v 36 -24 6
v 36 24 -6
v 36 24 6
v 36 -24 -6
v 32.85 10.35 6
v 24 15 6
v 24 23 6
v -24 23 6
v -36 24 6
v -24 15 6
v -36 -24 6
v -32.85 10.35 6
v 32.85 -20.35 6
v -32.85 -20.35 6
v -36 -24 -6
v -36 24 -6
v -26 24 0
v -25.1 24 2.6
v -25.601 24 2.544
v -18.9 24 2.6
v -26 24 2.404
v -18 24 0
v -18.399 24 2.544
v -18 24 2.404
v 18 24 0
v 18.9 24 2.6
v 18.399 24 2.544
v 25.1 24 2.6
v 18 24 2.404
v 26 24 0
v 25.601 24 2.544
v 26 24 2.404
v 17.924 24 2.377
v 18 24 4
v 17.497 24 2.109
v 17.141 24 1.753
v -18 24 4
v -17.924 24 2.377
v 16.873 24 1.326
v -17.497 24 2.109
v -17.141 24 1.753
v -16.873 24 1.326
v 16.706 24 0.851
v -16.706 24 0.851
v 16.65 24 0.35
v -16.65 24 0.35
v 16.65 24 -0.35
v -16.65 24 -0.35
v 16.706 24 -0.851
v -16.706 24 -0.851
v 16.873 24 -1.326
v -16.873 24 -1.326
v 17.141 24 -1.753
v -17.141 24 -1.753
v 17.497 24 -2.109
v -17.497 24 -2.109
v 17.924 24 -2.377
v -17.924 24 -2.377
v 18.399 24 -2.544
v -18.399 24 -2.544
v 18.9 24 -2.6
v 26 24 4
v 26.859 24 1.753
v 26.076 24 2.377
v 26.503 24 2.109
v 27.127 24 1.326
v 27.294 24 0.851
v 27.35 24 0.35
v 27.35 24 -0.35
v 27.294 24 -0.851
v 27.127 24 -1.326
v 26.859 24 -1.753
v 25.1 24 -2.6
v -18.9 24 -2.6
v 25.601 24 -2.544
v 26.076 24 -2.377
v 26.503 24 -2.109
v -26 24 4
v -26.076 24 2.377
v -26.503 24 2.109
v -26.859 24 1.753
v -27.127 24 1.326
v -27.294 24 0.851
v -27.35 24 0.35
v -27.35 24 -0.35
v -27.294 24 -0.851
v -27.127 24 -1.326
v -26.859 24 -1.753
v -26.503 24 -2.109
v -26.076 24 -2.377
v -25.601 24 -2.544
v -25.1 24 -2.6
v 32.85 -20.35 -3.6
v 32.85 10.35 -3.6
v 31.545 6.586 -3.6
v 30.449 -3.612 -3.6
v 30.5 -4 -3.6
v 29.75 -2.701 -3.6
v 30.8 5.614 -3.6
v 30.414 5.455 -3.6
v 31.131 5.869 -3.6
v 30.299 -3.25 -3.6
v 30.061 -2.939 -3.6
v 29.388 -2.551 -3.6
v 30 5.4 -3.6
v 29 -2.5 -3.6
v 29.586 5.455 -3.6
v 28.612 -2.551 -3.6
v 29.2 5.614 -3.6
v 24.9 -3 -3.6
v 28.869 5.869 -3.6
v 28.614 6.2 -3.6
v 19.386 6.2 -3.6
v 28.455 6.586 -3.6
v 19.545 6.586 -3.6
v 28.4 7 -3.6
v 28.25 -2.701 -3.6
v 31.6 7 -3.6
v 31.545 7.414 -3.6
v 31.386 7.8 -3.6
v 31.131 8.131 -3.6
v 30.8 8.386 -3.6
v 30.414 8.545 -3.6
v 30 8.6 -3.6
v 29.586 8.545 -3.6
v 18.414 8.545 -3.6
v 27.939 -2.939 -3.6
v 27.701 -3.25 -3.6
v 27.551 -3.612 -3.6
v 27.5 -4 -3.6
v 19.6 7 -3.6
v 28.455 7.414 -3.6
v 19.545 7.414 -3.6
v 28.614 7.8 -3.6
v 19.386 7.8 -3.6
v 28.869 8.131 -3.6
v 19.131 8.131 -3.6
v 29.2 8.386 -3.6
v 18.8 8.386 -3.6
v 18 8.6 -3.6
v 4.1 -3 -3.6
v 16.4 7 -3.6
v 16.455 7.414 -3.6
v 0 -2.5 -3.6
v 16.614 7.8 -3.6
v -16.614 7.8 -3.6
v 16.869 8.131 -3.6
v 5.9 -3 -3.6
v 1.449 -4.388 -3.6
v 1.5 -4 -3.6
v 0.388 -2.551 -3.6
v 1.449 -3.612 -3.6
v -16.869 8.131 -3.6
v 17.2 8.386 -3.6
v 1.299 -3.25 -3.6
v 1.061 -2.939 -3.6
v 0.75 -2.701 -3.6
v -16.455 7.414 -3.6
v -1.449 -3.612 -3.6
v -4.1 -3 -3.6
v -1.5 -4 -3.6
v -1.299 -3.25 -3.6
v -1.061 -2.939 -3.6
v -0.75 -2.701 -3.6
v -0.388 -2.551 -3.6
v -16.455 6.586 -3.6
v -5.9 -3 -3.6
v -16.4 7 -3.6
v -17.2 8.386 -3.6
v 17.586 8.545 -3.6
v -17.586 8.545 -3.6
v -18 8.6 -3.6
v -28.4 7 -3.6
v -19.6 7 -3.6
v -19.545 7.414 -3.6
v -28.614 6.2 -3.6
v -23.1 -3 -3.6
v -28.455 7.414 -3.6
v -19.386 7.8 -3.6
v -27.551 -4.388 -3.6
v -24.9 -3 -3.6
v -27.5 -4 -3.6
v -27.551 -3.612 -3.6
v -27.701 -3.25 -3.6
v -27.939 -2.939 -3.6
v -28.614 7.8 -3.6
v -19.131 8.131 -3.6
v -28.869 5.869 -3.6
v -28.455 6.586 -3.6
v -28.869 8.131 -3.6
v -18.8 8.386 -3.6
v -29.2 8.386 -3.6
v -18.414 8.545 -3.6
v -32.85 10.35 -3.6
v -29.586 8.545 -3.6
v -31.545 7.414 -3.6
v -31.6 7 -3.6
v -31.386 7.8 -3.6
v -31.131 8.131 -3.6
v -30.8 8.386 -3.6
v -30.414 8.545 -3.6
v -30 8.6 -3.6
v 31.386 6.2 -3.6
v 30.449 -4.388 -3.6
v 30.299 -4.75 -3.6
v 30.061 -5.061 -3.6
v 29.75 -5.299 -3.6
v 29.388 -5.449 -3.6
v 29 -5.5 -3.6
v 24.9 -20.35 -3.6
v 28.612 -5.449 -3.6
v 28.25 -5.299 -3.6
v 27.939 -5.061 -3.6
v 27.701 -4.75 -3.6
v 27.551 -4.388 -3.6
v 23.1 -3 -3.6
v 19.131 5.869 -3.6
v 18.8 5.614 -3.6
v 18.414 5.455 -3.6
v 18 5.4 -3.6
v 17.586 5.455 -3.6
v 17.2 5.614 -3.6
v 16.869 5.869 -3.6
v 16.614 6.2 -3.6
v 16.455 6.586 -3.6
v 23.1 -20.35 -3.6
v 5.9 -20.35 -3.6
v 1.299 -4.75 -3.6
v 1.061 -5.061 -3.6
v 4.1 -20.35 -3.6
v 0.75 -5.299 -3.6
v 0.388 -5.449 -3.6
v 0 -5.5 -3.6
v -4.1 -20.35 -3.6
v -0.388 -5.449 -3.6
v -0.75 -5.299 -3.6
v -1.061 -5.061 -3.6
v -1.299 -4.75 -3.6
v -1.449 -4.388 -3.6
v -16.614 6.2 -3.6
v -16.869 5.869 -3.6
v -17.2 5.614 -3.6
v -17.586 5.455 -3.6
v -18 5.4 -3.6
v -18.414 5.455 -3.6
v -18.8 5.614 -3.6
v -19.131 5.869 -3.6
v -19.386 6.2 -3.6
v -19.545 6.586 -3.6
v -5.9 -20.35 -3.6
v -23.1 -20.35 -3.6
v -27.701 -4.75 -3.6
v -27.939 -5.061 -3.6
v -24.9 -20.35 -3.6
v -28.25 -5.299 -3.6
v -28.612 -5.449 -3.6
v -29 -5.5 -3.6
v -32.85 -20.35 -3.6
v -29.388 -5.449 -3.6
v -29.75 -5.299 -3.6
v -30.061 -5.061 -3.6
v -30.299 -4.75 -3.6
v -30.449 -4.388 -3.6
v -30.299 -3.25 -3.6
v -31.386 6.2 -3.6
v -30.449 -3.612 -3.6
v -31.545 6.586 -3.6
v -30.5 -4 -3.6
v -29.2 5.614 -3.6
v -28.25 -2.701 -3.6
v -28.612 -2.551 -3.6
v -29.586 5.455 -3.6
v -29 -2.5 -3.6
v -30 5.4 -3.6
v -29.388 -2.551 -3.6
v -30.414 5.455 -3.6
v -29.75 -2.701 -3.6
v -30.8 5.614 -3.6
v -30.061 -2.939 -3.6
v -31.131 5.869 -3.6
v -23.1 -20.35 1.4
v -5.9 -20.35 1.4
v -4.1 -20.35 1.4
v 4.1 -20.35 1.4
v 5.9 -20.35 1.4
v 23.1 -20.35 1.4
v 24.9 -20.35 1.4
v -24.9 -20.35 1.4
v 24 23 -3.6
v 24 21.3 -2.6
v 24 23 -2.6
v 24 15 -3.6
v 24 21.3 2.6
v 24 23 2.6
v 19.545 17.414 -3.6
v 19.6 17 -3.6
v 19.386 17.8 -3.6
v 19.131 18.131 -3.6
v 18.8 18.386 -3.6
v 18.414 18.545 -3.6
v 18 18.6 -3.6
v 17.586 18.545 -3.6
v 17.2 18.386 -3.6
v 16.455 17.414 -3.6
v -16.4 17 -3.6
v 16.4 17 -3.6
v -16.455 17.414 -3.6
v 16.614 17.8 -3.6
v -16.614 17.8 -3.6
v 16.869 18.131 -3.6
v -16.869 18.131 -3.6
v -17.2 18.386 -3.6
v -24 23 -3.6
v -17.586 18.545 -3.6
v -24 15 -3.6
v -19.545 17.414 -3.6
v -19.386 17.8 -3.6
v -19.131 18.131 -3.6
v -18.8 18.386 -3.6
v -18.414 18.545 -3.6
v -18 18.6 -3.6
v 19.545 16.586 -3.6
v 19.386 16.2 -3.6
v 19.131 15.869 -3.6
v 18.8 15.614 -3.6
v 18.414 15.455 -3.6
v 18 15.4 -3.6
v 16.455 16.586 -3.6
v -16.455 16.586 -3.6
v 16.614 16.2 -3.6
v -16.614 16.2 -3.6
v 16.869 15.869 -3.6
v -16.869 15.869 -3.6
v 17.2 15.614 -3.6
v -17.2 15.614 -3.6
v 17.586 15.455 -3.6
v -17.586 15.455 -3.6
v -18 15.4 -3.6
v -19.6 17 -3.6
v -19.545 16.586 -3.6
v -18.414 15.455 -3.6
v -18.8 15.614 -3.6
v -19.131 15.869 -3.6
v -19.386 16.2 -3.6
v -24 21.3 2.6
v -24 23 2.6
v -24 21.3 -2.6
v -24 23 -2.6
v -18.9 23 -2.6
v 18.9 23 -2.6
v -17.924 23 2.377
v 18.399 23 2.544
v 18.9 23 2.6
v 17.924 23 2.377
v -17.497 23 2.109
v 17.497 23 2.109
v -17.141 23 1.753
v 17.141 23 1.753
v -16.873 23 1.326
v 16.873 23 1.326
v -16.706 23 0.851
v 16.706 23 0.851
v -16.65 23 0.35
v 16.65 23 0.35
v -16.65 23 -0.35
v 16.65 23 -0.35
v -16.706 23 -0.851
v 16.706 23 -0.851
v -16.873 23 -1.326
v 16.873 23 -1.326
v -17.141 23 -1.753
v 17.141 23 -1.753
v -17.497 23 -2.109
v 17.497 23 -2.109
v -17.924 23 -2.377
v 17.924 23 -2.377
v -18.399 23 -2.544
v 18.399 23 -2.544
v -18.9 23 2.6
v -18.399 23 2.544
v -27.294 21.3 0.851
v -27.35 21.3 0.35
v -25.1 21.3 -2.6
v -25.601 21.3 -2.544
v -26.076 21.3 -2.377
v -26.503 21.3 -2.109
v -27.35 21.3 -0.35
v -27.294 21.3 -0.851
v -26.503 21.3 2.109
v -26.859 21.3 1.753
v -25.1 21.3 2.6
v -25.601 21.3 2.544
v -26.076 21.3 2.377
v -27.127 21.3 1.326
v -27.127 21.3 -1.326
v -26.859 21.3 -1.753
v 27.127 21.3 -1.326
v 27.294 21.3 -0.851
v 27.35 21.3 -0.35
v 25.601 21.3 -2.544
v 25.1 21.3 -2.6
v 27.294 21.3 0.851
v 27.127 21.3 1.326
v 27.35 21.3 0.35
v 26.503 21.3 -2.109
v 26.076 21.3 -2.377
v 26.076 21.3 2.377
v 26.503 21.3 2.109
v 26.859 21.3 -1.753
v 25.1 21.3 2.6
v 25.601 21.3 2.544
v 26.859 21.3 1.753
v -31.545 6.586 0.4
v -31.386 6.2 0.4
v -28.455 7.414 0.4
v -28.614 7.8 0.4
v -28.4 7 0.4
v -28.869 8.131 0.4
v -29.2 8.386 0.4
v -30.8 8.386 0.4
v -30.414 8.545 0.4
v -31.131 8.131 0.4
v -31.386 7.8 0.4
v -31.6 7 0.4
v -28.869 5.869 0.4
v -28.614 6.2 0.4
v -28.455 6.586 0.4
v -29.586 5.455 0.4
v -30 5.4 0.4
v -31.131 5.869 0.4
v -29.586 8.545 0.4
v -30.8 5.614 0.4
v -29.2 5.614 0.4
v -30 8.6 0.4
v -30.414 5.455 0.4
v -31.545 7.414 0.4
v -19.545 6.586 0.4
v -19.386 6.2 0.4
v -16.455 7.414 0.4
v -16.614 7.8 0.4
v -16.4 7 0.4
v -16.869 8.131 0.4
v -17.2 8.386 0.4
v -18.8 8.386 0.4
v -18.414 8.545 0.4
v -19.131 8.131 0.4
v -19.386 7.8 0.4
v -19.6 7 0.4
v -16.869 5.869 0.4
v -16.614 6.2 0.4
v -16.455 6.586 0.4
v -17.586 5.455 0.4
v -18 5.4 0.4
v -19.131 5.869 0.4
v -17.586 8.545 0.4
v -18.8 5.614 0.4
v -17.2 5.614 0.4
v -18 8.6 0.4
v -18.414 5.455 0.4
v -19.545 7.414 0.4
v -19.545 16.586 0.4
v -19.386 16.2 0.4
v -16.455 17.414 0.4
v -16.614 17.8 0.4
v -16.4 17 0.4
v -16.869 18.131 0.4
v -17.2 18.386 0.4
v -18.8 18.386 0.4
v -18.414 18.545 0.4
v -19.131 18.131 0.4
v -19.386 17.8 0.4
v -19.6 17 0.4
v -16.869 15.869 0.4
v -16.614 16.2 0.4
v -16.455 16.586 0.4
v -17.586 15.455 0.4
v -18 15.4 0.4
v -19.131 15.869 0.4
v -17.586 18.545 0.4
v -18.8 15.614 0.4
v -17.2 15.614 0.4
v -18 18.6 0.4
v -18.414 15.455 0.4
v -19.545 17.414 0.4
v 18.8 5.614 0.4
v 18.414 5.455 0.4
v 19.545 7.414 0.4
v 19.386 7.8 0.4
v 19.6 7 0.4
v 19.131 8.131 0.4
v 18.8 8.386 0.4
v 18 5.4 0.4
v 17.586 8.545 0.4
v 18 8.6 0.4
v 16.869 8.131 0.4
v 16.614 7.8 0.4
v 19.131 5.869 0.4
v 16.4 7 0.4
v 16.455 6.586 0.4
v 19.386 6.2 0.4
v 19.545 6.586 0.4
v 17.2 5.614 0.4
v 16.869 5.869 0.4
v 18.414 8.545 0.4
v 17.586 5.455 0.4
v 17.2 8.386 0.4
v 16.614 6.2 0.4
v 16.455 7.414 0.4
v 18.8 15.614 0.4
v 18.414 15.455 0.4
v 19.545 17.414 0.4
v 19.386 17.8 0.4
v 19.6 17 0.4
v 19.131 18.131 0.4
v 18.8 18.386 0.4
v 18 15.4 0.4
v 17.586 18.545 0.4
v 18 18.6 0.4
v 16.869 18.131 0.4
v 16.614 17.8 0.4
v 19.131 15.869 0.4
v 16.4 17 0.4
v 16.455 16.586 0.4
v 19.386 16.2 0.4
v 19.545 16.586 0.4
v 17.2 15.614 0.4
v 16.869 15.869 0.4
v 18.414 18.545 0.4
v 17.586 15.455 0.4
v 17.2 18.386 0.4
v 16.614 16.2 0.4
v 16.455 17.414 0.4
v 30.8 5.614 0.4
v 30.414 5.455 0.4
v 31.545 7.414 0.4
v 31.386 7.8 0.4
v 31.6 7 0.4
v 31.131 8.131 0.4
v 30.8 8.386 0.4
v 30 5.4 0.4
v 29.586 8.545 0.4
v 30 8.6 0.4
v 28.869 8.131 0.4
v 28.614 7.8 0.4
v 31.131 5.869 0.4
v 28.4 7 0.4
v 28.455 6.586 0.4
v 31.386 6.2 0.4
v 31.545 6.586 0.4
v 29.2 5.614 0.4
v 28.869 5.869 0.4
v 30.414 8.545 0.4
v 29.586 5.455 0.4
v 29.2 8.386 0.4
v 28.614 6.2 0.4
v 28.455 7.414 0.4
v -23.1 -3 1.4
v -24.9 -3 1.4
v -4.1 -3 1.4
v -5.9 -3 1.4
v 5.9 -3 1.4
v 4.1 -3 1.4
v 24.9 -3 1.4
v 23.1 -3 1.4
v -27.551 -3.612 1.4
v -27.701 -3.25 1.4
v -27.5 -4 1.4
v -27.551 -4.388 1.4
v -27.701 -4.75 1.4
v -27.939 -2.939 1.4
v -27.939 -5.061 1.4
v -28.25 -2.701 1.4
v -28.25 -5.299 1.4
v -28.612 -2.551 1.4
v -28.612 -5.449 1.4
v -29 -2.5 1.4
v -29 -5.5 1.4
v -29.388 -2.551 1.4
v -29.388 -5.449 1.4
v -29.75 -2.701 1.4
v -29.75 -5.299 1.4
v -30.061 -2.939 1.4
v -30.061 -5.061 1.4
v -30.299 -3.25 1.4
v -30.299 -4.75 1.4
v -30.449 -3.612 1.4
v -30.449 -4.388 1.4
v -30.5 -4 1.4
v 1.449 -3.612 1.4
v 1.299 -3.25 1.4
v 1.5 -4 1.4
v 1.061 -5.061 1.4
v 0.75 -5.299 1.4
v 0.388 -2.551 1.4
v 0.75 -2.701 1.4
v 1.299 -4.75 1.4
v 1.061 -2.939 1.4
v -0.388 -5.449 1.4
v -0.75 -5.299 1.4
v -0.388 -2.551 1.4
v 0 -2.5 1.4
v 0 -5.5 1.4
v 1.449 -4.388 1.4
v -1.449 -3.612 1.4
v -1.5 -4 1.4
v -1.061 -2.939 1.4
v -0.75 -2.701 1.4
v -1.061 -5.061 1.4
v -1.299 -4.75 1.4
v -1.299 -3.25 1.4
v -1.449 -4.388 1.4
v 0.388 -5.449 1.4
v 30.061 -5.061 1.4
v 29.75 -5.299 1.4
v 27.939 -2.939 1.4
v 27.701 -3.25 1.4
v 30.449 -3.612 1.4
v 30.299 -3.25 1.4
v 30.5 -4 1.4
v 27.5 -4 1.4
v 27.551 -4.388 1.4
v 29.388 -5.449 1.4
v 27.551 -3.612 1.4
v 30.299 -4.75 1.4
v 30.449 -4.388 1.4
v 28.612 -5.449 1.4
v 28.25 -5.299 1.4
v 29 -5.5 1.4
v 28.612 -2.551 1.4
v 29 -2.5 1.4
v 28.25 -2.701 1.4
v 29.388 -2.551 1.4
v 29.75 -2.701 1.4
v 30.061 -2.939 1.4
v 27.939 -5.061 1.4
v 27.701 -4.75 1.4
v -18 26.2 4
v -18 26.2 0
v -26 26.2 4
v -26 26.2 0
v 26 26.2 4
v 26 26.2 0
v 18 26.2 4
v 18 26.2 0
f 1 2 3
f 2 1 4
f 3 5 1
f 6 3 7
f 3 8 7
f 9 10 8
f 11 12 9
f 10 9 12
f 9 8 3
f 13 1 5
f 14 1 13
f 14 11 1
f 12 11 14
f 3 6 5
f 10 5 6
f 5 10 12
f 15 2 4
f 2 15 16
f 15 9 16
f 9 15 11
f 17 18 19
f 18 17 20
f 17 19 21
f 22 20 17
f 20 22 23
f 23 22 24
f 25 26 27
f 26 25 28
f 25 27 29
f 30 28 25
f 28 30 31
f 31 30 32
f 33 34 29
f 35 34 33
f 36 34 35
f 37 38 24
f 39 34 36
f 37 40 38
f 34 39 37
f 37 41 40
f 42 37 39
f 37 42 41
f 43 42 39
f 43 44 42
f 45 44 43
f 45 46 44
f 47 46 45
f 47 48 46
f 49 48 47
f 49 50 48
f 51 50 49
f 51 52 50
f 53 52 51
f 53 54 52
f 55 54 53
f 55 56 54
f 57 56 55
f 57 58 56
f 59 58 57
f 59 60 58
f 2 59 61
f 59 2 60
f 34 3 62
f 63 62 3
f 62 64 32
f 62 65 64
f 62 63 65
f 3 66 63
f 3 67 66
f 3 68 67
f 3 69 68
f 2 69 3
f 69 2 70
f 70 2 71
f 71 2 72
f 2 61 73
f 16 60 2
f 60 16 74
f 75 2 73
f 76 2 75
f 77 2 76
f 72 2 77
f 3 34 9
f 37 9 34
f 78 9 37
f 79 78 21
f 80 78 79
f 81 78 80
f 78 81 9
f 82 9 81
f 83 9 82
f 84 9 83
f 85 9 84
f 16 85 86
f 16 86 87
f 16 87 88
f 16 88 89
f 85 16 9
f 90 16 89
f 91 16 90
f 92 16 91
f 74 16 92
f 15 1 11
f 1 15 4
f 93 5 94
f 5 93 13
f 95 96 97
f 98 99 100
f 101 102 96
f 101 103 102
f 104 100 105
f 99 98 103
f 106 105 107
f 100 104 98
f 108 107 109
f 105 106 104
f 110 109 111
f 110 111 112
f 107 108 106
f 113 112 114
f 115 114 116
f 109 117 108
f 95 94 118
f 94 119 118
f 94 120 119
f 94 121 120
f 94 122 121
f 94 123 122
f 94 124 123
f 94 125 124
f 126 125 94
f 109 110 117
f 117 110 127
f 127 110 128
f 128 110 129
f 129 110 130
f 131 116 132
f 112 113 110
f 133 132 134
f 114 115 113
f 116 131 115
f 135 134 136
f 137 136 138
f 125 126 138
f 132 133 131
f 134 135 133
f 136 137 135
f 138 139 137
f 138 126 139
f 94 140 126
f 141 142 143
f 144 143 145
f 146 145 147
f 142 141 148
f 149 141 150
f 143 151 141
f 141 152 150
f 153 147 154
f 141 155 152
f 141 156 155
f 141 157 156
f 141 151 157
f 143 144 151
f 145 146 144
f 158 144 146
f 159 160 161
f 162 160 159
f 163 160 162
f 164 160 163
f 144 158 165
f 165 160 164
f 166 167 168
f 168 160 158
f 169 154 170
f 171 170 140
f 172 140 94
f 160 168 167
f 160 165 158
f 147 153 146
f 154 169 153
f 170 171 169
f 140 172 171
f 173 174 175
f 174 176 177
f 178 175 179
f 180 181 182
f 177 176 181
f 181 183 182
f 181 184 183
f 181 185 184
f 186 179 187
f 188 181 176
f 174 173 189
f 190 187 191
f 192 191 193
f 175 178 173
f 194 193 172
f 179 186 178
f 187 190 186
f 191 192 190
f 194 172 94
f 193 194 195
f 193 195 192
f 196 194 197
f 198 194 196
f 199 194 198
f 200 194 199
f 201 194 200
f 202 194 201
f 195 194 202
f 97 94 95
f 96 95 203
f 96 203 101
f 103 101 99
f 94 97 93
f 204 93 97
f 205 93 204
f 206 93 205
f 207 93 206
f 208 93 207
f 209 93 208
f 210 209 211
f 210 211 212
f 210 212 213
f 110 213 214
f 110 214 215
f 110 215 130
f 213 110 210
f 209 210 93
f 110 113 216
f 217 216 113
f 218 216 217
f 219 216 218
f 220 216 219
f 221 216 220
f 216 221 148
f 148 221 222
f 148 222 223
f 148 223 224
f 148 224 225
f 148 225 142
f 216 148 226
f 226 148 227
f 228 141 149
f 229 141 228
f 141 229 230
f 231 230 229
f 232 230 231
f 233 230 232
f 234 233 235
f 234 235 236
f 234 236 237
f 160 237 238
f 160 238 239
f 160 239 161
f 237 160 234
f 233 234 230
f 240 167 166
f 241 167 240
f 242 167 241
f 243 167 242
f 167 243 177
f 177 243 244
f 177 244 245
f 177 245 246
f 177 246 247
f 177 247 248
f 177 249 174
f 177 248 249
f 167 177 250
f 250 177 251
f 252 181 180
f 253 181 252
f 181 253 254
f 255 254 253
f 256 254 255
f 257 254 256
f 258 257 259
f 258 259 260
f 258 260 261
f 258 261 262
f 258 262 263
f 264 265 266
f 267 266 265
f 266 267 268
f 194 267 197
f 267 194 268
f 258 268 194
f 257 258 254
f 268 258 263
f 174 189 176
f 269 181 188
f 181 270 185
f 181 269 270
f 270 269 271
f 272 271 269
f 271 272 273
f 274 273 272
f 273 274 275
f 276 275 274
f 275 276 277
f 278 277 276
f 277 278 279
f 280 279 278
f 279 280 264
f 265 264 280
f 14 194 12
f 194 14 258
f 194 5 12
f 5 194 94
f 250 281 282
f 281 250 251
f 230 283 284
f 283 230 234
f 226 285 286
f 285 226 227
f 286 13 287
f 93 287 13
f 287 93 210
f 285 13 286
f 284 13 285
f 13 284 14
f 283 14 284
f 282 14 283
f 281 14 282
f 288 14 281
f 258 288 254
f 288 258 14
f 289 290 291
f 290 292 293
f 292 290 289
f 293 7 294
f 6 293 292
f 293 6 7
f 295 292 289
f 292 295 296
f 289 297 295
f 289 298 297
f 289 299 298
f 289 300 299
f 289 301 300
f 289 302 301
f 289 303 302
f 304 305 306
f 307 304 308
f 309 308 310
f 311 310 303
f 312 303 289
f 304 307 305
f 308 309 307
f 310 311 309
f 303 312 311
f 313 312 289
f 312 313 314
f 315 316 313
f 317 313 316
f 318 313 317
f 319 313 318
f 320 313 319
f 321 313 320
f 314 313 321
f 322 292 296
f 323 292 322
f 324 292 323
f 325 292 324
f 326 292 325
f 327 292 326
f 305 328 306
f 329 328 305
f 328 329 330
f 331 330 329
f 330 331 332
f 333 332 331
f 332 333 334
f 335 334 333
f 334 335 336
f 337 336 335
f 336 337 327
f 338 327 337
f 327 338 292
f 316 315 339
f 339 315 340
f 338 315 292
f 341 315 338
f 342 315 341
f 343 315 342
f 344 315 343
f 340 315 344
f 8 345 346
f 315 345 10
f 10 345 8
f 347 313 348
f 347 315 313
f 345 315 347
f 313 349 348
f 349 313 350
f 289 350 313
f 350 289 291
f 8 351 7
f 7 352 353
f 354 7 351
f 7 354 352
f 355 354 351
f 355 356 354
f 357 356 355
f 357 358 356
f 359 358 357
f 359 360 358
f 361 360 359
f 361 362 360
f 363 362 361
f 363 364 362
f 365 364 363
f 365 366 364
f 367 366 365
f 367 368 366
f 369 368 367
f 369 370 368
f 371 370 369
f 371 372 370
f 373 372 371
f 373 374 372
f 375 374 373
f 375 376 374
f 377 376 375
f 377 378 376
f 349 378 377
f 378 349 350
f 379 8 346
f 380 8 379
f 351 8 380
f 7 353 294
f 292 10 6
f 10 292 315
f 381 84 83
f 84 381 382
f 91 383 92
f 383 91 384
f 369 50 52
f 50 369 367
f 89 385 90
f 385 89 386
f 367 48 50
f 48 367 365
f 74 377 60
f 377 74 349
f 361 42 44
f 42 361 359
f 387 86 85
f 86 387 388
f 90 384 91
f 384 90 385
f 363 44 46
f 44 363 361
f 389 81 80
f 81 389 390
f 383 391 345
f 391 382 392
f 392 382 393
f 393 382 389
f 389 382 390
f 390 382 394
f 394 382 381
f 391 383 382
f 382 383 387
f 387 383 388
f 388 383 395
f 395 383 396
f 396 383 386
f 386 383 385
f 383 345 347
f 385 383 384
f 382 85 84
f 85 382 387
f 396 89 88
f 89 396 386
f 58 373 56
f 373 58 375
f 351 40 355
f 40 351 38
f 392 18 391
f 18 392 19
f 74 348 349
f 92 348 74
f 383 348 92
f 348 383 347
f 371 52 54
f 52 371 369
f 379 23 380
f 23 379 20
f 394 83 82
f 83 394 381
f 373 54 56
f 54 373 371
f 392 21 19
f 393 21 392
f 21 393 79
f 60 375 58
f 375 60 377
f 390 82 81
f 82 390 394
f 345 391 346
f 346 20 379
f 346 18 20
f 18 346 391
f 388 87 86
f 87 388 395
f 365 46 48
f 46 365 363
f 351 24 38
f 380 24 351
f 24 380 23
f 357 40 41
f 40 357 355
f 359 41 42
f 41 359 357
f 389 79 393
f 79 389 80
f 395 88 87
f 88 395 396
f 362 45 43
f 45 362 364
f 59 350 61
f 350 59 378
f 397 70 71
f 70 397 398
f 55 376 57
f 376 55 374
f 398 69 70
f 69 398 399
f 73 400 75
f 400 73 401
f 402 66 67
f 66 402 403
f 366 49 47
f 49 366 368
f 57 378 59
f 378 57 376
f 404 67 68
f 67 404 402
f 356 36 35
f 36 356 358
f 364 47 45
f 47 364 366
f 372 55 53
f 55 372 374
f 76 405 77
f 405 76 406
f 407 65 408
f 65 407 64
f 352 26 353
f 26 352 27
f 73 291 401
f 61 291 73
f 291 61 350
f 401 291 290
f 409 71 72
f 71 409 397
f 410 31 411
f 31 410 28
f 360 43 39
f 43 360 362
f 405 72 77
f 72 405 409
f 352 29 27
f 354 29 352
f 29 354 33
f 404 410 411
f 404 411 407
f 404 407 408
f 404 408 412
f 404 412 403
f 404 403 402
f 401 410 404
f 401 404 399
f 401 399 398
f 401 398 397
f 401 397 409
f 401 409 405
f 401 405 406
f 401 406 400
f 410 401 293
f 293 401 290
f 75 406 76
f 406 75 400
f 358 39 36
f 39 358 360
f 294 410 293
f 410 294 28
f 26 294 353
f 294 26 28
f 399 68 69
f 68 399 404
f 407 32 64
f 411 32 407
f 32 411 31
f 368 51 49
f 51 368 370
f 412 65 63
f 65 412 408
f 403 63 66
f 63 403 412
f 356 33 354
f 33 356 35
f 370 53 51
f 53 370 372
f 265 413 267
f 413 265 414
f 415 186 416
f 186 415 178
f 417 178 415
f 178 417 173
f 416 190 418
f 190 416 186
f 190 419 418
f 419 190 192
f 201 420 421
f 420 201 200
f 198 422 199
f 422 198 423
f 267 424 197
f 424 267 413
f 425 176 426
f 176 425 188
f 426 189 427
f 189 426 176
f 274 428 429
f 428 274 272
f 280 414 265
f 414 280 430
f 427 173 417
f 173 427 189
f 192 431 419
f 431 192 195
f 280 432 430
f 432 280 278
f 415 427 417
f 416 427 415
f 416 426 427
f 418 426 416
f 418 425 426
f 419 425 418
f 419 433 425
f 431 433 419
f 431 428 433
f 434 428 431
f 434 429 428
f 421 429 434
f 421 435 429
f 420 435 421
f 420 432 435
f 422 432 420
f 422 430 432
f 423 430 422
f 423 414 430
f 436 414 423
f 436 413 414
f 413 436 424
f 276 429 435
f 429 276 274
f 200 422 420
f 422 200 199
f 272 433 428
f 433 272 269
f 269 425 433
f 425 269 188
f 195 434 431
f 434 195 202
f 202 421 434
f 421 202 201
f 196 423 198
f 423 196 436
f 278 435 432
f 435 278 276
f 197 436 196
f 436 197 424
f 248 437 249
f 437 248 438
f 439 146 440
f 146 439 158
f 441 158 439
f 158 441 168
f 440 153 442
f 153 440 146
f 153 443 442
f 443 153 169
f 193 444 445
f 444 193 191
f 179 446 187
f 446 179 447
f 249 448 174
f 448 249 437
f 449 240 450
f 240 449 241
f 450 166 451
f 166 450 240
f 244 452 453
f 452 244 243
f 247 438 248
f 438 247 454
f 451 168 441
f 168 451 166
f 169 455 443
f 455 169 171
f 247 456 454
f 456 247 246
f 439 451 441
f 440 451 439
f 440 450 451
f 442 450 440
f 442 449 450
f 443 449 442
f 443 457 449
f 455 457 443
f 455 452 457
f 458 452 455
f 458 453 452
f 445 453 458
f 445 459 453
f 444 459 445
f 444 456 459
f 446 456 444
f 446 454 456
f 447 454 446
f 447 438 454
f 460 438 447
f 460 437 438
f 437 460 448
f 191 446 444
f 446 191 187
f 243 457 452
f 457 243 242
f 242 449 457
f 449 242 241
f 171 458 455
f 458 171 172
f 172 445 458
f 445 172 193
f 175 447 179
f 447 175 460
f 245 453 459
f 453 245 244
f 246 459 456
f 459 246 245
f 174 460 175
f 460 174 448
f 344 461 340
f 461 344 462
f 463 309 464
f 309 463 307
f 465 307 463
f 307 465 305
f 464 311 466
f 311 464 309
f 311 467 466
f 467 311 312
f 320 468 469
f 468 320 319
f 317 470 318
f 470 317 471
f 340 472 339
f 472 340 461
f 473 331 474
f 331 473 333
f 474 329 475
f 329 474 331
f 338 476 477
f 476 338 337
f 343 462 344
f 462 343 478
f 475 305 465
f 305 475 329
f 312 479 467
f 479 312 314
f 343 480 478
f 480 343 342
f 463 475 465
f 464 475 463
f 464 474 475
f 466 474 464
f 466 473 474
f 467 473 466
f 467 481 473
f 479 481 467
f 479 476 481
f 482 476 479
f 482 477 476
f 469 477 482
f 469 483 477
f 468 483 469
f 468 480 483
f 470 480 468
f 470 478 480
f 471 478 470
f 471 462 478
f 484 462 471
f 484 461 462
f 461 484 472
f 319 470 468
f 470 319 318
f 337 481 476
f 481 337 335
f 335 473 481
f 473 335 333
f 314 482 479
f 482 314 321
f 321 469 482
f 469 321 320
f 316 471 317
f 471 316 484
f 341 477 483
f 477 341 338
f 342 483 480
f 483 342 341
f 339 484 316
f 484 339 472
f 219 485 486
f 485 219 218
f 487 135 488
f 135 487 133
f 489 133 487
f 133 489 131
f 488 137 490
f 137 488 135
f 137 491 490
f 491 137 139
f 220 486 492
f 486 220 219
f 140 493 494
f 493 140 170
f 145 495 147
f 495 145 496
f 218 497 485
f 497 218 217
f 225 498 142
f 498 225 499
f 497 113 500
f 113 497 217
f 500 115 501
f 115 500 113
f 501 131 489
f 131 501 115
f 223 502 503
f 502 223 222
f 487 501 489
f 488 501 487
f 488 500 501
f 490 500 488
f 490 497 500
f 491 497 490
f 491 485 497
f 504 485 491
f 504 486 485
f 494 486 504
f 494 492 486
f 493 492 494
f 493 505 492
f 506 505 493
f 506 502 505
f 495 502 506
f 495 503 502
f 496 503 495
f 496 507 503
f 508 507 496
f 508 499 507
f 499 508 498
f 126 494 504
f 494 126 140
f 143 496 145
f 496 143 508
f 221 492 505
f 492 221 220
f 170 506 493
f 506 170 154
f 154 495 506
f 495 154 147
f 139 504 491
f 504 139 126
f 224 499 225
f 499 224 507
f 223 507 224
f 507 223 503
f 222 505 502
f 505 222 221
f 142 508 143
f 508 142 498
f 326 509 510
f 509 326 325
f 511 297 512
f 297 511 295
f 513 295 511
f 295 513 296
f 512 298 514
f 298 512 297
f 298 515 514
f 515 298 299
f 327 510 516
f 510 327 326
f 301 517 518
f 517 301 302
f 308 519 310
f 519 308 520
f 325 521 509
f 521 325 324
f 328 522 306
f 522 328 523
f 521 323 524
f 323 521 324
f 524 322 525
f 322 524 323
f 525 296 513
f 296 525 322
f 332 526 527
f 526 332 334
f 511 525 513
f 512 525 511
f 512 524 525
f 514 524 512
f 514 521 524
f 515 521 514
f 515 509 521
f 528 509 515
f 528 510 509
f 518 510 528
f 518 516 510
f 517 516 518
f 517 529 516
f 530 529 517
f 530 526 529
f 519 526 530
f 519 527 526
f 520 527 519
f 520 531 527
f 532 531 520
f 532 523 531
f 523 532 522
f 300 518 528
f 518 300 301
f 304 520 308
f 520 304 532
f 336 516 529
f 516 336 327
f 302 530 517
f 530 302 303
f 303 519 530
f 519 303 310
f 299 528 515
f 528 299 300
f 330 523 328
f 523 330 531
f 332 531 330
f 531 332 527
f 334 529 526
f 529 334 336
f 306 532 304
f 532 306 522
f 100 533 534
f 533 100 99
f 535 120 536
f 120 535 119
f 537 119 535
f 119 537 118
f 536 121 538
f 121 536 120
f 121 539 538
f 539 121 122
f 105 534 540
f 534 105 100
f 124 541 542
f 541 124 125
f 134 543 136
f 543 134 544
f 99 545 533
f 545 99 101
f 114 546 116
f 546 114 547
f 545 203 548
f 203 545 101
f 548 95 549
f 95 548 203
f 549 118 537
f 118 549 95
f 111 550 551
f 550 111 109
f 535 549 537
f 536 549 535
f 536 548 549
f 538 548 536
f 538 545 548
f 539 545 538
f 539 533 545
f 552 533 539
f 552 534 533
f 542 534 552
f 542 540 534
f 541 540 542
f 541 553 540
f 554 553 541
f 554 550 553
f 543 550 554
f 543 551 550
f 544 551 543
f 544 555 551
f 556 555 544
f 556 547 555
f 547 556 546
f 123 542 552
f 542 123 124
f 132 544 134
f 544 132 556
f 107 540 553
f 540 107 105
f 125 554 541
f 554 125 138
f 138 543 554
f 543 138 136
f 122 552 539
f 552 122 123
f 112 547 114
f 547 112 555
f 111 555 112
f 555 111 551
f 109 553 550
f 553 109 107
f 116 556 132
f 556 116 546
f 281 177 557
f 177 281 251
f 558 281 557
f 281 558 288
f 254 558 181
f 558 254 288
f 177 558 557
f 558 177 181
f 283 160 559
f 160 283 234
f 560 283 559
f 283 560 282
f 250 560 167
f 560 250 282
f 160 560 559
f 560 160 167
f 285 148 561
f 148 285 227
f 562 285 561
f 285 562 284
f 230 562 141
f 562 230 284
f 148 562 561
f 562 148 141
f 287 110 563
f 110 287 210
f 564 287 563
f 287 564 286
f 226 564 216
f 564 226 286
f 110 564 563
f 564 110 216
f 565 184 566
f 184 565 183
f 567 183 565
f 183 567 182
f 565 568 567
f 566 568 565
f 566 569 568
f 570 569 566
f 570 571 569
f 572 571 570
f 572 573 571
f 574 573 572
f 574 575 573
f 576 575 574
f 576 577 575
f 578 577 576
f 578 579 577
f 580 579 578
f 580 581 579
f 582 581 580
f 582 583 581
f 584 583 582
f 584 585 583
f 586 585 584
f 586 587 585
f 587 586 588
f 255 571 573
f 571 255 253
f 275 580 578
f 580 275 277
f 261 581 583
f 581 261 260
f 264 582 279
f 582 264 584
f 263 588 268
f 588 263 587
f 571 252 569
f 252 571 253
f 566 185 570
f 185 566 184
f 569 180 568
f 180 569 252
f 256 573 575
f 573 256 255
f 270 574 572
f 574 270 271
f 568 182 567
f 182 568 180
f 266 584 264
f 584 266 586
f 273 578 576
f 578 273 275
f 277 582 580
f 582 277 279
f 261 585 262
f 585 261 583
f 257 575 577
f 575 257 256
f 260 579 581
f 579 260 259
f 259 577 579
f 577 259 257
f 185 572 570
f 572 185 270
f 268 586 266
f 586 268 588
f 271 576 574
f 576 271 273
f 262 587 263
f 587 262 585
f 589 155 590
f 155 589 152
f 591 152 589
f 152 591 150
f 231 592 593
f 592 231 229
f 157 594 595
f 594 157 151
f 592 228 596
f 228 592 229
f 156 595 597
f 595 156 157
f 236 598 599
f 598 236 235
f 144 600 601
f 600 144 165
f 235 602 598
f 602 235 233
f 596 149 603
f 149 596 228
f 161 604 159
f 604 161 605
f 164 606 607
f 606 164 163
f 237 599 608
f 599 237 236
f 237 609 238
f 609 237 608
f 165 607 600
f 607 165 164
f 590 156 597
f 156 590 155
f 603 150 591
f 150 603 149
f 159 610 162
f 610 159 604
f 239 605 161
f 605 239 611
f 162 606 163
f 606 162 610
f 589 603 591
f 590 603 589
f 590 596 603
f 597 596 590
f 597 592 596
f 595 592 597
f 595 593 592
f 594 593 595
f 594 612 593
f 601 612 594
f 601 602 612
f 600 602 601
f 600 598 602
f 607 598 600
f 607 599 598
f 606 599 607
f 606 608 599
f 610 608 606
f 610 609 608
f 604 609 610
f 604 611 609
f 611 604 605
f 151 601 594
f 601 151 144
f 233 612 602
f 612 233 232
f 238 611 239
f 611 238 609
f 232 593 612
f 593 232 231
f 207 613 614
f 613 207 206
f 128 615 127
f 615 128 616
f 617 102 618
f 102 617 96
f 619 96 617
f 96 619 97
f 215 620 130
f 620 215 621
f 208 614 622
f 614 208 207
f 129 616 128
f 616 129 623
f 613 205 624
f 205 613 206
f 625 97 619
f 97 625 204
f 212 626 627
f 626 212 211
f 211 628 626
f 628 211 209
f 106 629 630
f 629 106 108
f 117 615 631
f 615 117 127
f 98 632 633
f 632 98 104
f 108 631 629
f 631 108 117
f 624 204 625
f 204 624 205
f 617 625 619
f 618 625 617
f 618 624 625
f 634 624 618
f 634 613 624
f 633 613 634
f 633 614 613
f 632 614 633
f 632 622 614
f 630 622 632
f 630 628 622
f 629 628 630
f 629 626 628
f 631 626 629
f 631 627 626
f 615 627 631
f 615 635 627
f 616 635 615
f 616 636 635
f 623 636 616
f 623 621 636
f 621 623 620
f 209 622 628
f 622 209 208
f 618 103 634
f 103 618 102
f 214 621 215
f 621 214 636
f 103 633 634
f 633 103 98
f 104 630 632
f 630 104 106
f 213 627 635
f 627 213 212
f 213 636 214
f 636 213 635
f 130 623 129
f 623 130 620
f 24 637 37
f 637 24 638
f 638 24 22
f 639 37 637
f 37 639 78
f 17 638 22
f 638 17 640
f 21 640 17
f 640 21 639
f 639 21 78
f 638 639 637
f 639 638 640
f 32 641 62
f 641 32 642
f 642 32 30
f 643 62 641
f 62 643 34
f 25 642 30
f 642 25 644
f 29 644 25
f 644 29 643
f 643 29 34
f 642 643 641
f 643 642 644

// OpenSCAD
// DRACO-Mini electronics cartridge — corrected zone architecture
// IMPORTANT: final dimensions come from BUILD_HANDOFF.md physical-hardware measurements.
// The Raspberry Pi is COMPUTE, never the power subsystem.
compute_board_x = 65; // PLACEHOLDER until actual installed Pi is measured
compute_board_y = 30; // PLACEHOLDER until actual installed Pi is measured
fit_clearance = 0.35;
tray_x=72; tray_y=48; tray_z=12; wall=2.4;
compute_clear_x=compute_board_x+2*fit_clearance; compute_clear_y=compute_board_y+2*fit_clearance;

// Connector datums (mm), relative to cartridge center.
// Keep these parameters tied to the measured board/adapter connector centerlines.
usb_c_power_x = -22;
usb_c_data_x  =  22;
usb_c_center_z = 0;
usb_c_open_w = 10.0;
usb_c_open_h = 4.5;
usb_c_corner_r = 2.25;
connector_clearance = 0.35;
rear_wall_y = tray_y/2;

// Explicit non-overlapping functional zones.
compute_zone_x = 0; compute_zone_y = -7;
power_zone_x = -24; power_zone_y = 12; power_zone_w = 18; power_zone_d = 16;
data_zone_x  =  24; data_zone_y  = 12; data_zone_w  = 18; data_zone_d  = 16;
post_d = 3.2; post_h = 4;
// Three front sensor harness lanes line up with the redesigned shell bays.
sensor_lane_x = [-29,0,29];
sensor_lane_w = 7; sensor_lane_d = 20; sensor_lane_h = 5;
strain_post_d=3; strain_post_h=5;

module snap_tab(){ cube([8,2.2,4],center=true); }
module rounded_usb_c_cutout(w=usb_c_open_w+2*connector_clearance,h=usb_c_open_h+2*connector_clearance,depth=wall+3){
    hull(){
        for(x=[-w/2+usb_c_corner_r,w/2-usb_c_corner_r])
            for(z=[-h/2+usb_c_corner_r,h/2-usb_c_corner_r])
                translate([x,0,z]) rotate([90,0,0]) cylinder(r=usb_c_corner_r,h=depth,center=true,$fn=28);
    }
}
module zone_posts(cx,cy,w,d){
    for(x=[cx-w/2+3,cx+w/2-3]) for(y=[cy-d/2+3,cy+d/2-3])
        translate([x,y,-tray_z/2+wall+post_h/2]) cylinder(d=post_d,h=post_h,center=true,$fn=24);
}
module sensor_harness_guides(){
    // Open guide pairs route each sensor harness independently into the cartridge.
    for(cx=sensor_lane_x){
        for(dx=[-sensor_lane_w/2-1.5,sensor_lane_w/2+1.5])
            translate([cx+dx,-tray_y/2+11,-tray_z/2+wall+2.5])
                cube([1.8,sensor_lane_d,strain_post_h],center=true);
        // Strain-relief posts provide a tie point before the compute/power zones.
        translate([cx,-tray_y/2+20,-tray_z/2+wall+strain_post_h/2])
            cylinder(d=strain_post_d,h=strain_post_h,center=true,$fn=24);
    }
}
module electronics_cartridge(){
    difference(){
        cube([tray_x,tray_y,tray_z],center=true);
        // Main compute cavity.
        translate([0,-5,wall]) cube([compute_clear_x,compute_clear_y,tray_z],center=true);
        // Cable-routing corridor between electronics and connector wall.
        translate([0,19,wall]) cube([48,8,tray_z],center=true);
        // USB-C power and data openings, physically aligned to their internal zones.
        translate([usb_c_power_x,rear_wall_y,usb_c_center_z]) rounded_usb_c_cutout();
        translate([usb_c_data_x,rear_wall_y,usb_c_center_z]) rounded_usb_c_cutout();
    }
    // Power interface posts are separate from the compute cavity.
    zone_posts(power_zone_x,power_zone_y,power_zone_w,power_zone_d);
    zone_posts(data_zone_x,data_zone_y,data_zone_w,data_zone_d);
    sensor_harness_guides();
    translate([-22,tray_y/2+1.1,2]) snap_tab();
    translate([22,tray_y/2+1.1,2]) snap_tab();
}
// Release gate: this source is architectural until the actual Pi, power hardware,
// RJ45/USB-C plug envelopes and fan measurements pass the fit coupon.
electronics_cartridge();
